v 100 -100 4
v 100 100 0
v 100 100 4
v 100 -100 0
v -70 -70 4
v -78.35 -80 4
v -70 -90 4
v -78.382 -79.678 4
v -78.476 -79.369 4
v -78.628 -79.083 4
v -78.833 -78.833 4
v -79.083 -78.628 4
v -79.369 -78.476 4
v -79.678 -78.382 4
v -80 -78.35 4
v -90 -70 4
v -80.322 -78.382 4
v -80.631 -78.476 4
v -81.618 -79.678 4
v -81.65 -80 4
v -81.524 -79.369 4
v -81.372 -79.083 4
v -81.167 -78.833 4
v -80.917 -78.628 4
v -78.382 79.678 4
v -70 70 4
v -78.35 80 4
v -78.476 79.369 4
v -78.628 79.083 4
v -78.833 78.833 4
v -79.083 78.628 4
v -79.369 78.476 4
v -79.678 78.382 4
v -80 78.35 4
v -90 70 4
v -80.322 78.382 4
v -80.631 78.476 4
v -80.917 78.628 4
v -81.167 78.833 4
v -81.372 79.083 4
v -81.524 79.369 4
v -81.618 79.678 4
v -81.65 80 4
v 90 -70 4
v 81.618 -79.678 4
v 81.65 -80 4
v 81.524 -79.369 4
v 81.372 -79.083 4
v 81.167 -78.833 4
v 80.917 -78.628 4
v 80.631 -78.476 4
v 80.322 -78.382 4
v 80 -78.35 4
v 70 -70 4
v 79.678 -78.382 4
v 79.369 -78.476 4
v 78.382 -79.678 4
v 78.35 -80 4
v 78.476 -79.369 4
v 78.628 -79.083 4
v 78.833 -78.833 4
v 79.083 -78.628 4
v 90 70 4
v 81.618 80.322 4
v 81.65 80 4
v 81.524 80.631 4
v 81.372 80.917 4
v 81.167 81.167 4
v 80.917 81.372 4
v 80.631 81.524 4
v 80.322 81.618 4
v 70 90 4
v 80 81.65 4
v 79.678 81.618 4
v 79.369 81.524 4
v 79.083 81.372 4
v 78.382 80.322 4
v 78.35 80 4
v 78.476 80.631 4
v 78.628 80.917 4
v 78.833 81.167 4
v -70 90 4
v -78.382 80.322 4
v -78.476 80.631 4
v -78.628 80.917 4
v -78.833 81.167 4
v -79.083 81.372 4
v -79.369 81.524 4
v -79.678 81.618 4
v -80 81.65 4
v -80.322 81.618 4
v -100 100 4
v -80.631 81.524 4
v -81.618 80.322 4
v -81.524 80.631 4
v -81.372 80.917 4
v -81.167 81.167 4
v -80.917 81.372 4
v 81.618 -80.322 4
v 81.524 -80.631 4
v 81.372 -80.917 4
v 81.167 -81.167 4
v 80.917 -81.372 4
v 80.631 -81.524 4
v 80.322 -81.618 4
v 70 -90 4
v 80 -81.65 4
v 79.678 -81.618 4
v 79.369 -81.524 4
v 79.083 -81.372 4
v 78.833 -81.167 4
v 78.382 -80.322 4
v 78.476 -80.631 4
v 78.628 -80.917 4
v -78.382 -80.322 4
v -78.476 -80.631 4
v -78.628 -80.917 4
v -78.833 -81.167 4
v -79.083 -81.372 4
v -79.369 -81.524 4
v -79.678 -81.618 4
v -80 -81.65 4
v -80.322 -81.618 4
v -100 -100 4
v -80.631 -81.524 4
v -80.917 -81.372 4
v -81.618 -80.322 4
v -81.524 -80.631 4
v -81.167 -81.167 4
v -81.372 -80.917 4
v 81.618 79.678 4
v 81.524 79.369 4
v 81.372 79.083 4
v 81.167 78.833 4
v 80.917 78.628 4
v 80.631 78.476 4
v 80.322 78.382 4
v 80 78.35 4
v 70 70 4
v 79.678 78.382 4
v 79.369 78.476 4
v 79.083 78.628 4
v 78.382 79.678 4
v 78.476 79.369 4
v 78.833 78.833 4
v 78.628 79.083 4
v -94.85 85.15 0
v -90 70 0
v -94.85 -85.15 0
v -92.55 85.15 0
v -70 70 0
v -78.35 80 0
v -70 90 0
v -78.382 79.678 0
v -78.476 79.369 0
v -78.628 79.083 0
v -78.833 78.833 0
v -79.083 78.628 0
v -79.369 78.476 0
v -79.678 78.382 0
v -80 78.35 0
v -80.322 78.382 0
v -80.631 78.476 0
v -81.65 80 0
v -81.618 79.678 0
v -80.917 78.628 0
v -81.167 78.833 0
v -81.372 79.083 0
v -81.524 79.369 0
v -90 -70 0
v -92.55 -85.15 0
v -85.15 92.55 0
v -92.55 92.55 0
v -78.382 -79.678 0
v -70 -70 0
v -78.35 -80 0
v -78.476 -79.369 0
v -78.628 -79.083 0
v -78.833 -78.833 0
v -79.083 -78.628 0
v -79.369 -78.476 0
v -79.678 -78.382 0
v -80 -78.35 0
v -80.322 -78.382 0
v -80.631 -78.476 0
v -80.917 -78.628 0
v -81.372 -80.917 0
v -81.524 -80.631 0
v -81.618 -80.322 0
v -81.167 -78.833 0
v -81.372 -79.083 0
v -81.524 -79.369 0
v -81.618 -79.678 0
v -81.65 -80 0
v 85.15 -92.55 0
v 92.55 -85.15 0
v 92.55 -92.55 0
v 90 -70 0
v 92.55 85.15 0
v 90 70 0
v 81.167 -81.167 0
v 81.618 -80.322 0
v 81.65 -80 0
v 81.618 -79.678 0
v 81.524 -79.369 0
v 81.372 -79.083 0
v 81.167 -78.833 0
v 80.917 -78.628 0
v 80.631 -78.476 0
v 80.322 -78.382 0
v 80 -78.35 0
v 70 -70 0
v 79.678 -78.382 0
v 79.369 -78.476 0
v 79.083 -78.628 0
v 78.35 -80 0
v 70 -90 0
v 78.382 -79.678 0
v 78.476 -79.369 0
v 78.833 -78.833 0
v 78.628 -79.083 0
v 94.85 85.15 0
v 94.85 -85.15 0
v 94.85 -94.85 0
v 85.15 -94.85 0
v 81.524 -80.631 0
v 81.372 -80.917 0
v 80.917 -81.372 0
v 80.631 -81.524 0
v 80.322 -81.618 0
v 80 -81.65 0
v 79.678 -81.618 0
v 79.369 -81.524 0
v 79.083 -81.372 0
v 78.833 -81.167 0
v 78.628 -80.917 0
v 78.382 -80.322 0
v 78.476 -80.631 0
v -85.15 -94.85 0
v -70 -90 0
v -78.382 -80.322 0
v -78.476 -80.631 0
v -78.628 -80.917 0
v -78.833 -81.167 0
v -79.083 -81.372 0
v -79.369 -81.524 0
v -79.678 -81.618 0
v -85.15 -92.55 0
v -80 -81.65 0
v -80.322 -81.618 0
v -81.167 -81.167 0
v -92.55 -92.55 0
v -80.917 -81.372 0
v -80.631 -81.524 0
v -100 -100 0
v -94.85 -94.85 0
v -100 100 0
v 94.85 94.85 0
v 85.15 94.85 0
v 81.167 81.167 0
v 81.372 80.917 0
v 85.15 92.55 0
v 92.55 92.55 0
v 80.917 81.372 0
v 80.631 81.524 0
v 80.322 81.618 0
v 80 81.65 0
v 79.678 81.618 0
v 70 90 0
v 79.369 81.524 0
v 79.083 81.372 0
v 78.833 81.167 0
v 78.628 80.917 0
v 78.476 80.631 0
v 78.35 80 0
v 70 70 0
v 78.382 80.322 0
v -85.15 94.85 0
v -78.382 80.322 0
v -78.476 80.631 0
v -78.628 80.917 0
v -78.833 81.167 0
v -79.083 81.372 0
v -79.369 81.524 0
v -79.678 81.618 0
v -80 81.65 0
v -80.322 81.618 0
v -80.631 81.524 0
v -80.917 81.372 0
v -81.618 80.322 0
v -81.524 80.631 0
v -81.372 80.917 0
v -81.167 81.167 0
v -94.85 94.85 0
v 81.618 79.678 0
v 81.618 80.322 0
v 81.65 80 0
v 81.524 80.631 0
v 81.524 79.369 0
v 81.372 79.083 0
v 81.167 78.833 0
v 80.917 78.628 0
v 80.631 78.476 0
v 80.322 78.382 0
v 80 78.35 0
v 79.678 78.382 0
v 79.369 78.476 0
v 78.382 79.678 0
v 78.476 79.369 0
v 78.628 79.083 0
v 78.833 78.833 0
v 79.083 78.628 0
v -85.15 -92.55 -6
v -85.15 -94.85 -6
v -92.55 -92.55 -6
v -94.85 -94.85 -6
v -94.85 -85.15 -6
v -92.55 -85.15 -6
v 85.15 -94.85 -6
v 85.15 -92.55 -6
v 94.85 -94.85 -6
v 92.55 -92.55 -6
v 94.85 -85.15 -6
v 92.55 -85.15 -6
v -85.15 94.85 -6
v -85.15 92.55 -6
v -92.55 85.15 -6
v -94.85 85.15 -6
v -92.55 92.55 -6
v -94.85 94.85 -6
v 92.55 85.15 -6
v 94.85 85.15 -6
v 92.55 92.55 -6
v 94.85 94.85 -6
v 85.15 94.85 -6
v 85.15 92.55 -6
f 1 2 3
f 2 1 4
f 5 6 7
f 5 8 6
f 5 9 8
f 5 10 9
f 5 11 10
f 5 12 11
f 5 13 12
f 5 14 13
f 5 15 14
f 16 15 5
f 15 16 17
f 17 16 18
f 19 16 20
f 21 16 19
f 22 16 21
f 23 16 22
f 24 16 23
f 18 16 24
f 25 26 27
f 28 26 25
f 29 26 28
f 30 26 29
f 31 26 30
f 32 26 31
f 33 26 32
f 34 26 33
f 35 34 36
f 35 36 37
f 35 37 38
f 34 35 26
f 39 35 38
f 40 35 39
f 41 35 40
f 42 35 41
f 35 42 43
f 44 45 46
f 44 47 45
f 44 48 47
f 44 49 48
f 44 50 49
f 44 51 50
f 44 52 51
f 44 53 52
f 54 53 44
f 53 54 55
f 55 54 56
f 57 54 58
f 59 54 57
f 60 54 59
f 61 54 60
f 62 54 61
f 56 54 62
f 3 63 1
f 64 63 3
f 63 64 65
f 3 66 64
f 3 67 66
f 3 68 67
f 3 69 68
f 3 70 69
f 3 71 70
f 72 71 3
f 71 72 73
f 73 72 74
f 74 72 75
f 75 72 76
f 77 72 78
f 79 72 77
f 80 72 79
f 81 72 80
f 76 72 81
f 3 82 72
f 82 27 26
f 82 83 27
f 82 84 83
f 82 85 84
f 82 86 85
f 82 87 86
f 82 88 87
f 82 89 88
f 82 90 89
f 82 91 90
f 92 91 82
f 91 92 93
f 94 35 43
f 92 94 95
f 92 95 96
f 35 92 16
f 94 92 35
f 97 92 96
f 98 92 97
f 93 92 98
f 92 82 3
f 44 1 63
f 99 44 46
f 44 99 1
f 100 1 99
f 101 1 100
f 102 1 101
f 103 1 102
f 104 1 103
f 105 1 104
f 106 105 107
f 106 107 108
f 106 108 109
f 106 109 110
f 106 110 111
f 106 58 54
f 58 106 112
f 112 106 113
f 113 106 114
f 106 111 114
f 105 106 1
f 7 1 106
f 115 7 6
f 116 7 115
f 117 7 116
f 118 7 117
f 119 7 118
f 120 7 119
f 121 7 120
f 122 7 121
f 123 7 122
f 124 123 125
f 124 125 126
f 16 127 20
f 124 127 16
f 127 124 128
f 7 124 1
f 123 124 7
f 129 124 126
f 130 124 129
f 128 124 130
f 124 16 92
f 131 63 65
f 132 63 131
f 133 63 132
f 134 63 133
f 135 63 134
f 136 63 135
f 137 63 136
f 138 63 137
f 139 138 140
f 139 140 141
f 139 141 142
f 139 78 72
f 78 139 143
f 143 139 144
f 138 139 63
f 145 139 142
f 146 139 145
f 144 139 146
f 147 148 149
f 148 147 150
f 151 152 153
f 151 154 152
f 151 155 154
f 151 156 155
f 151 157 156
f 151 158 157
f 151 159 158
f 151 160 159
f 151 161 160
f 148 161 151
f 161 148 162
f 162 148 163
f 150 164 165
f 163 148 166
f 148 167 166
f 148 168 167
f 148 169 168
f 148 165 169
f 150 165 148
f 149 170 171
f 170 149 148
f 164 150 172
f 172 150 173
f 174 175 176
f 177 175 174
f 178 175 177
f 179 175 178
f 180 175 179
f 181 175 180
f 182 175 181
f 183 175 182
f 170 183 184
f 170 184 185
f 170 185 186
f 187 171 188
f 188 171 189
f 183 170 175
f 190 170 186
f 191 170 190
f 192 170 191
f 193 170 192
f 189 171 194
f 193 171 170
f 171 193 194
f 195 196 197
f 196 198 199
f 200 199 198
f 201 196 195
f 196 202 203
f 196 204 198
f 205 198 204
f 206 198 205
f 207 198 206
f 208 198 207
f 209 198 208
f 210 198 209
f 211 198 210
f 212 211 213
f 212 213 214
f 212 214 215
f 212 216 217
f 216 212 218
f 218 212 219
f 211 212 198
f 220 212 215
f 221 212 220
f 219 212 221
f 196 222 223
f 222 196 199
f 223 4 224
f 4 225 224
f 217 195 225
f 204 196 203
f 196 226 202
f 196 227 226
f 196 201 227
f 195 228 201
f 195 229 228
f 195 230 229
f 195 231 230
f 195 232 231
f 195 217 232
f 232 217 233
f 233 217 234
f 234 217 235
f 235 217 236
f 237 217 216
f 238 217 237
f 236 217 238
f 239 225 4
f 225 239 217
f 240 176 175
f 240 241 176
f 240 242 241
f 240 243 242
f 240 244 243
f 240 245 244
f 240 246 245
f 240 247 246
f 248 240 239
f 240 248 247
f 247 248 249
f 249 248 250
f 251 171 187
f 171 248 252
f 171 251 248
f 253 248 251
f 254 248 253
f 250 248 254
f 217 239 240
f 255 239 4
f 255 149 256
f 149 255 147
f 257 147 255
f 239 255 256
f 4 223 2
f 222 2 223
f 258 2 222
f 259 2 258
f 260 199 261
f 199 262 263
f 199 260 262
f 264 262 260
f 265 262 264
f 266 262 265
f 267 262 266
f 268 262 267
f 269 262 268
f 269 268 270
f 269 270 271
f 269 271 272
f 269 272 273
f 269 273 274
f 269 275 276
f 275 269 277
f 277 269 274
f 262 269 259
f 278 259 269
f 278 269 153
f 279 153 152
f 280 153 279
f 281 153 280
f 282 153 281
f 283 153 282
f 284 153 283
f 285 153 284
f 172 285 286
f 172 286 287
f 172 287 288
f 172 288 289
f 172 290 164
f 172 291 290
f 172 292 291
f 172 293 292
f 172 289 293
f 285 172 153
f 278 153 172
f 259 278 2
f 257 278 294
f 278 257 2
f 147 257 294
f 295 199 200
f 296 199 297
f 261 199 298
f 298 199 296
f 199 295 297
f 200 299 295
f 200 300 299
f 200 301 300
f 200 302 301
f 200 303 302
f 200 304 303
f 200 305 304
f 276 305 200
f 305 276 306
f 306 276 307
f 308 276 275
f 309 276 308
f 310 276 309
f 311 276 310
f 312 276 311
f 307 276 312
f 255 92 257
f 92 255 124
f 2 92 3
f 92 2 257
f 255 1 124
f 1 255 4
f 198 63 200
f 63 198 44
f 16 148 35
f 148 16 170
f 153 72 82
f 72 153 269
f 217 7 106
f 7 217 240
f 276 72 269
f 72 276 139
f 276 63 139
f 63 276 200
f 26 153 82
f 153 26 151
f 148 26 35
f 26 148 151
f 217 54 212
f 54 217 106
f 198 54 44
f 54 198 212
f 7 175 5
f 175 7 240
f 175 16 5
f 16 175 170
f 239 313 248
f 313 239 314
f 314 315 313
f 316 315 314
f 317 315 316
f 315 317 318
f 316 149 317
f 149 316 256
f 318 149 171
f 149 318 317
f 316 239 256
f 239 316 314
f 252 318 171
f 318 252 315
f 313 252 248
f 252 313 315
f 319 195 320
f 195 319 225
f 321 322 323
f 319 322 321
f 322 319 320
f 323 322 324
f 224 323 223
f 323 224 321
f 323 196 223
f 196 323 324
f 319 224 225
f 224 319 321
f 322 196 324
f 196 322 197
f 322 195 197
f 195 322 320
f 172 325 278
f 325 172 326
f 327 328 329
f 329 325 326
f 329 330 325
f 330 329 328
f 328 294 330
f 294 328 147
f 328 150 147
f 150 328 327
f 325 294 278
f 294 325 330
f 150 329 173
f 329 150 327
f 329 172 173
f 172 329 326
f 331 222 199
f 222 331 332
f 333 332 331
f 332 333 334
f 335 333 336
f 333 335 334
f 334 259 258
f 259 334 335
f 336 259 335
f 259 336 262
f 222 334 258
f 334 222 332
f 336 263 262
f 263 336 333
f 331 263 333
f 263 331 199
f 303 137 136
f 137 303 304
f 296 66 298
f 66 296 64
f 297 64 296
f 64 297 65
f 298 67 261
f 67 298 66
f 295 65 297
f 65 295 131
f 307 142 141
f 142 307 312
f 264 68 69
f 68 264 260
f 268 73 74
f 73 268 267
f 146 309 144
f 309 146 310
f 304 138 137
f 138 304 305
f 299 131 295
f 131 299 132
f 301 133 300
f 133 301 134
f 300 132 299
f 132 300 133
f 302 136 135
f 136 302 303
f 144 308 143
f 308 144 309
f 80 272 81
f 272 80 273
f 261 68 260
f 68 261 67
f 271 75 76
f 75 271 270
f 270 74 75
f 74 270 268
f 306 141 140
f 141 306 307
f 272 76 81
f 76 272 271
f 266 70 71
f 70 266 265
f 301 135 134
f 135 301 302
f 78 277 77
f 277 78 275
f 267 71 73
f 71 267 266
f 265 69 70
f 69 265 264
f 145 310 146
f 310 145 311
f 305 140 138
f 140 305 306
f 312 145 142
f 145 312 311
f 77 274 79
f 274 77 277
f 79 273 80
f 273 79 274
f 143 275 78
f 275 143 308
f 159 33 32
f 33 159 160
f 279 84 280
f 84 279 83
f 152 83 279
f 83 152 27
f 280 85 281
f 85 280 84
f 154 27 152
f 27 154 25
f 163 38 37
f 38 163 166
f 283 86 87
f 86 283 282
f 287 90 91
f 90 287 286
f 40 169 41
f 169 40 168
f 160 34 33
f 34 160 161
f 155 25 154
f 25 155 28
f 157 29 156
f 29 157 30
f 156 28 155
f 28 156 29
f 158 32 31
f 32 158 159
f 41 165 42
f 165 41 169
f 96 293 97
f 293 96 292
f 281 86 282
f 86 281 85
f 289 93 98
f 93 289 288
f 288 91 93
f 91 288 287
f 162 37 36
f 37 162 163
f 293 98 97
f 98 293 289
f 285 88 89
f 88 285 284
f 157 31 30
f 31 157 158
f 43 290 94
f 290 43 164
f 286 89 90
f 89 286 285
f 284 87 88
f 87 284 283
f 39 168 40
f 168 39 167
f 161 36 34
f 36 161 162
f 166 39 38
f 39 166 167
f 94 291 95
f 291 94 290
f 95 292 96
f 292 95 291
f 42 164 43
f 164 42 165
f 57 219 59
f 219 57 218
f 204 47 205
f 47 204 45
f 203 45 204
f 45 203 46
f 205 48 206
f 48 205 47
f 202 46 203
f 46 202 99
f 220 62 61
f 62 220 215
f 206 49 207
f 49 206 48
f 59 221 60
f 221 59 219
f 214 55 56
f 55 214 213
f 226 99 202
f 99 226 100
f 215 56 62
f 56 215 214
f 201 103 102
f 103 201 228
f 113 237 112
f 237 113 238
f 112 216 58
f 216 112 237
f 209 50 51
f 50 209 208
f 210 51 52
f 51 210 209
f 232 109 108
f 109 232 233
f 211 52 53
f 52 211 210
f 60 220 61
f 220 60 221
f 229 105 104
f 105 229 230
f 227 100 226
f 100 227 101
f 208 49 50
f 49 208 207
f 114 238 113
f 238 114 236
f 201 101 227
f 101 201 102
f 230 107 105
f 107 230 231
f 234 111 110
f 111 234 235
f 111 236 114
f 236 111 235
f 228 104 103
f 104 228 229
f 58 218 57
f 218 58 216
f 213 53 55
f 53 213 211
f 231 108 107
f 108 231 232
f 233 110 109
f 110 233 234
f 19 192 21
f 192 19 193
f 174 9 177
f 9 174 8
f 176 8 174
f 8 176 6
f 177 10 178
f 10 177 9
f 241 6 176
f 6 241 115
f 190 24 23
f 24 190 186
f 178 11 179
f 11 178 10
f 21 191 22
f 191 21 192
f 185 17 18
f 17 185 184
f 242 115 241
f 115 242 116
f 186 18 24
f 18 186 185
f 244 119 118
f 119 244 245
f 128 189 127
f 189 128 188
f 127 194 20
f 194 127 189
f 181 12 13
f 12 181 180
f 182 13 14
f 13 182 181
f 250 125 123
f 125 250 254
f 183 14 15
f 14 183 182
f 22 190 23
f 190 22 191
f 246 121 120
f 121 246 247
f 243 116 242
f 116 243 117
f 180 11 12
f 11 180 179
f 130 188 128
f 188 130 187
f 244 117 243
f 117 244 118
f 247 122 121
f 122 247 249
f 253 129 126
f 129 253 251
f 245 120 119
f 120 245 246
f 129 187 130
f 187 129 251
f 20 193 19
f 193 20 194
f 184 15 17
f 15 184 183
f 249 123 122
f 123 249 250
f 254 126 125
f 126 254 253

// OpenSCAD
// file: screws.scad
/* Some common screw dimensions */


inf = 400; // basically infinity

/********************************************************************************/
// M3 dimensions

m3HoleRadiusSlack = 0.15;
m3Diameter = 3.0;
m3Radius = m3Diameter/2.0;

m3RadiusSlacked = m3Radius + m3HoleRadiusSlack;

// legacy TODO: replace
m3ptr = m3RadiusSlacked;

// NUTS!
m3HexNutWidthAcrossFlats = 5.41;
m3HexNutWidthAcrossCorners = FtoG(m3HexNutWidthAcrossFlats);

m3HexNutThickness = 2.18;

module m3HexNutPocketNegative() {
  hexNutPocketNegative(m3RadiusSlacked,
                       m3HexNutWidthAcrossCorners/2 + 0.1,
                       m3HexNutThickness + 0.2);
}


// TODO: remove test

*difference() {
  cube(size=[8,12,5], center=true);

  rotate(a=[0,0,20])
  m3HexNutPocketNegative();
}

*m3HexNutPocketNegative();


/********************************************************************************/
// M4 dimensions

m4HoleRadiusSlack = 0.15;
m4Diameter = 4.0;
m4Radius = m4Diameter/2.0;
m4RadiusSlacked = m4Radius + m4HoleRadiusSlack;

m4HexNutWidthAcrossFlats = 6.89;
m4HexNutWidthAcrossCorners = FtoG(m4HexNutWidthAcrossFlats);

m4HexNutThickness = 3.07;

module m4HexNutPocketNegative() {
  hexNutPocketNegative(m4RadiusSlacked,
                       m4HexNutWidthAcrossCorners/2 + 0.1,
                       m4HexNutThickness + 0.2);
}


// TODO: remove test

*difference() {
  translate(v=[0,1,0])
  cube(size=[10,12,6], center=true);

  rotate(a=[0,0,20])
  m4HexNutPocketNegative();
}

*m4HexNutPocketNegative();

/********************************************************************************/

// Convert a regular hexagon widthAcrossFlats to widthAcrossCorners
function FtoG(widthAcrossFlats) = widthAcrossFlats * (2/sqrt(3));  

// Convert a regular hexagon widthAcrossCorners to widthAcrossFlats
function GtoF(widthAcrossCorners) =  widthAcrossCorners * (sqrt(3)/2);


module hexNutPocketNegative(
  innerRadius,
  widthAcrossCorners,
  thickness)
{

  union() {

    hull() {
      // hexagonal cylinder representing where the nut should fit
      cylinder(r=widthAcrossCorners, h=thickness, center=true, $fn=6);

      // negative volume for sliding in the nut
      translate(v=[inf,0,0])
      cylinder(r=widthAcrossCorners, h=thickness, center=true, $fn=6);
    }

    // negative volume for screw lead
    translate(v=[0,0,-10])
    cylinder(r=innerRadius, h = inf, $fn=32);

    hull() {
     translate(v=[inf,0,0])
       cylinder(r=innerRadius, h = inf, $fn=32);
     cylinder(r=innerRadius, h = inf, $fn=32);
    }
  }
}
// file: ../common.scad
/* Some initial configurations and commonly used variables
   plus functions
*/

$fn=64;


eps=0.01;

inf10 = 10;
inf50 = 50;
inf1000 = 1000;
inf = inf1000;
// main file
include <../common.scad>
include <./screws.scad>

$fn=64;

module baseFrame() {
  difference() {
    cube(size=[200,200,4], center=true);
    cube(size=[180,180,4], center=true);
  }

  translate(v=[80,80,0])
  cube(size=[20,20, 4],center=true);

  translate(v=[-80,80,0])
  cube(size=[20,20, 4],center=true);

  translate(v=[80,-80,0])
  cube(size=[20,20, 4],center=true);

  translate(v=[-80,-80,0])
  cube(size=[20,20, 4],center=true);
}

module lugBottom() {
  difference() {
    cube(size=[9.7,9.7,6], center=true);

    translate(v=[2,2,0])
    cube(size=[9.1,9.1,5+1], center=true);
  }
  
}


module base() {

  difference() {
    union() {
      translate(v=[0,0,4/2])
        baseFrame();


      translate(v=[-90,-90,-6/2])
        lugBottom();

      mirror(v=[1,0,0])
        translate(v=[-90,-90,-6/2])
        lugBottom();

      mirror(v=[0,1,0])
        translate(v=[-90,-90,-6/2])
        lugBottom();

      mirror(v=[1,1,0])
        translate(v=[-90,-90,-6/2])
        lugBottom();
    }

    union() {
      translate(v=[80,80,0]) 
      cylinder(h = 100, r = m3ptr, $fn=32, center=true);

      translate(v=[-80,80,0]) 
      cylinder(h = 100, r = m3ptr, $fn=32, center=true);

      translate(v=[80,-80,0]) 
      cylinder(h = 100, r = m3ptr, $fn=32, center=true);

      translate(v=[-80,-80,0]) 
      cylinder(h = 100, r = m3ptr, $fn=32, center=true);
      
    }
  }
}

base();
